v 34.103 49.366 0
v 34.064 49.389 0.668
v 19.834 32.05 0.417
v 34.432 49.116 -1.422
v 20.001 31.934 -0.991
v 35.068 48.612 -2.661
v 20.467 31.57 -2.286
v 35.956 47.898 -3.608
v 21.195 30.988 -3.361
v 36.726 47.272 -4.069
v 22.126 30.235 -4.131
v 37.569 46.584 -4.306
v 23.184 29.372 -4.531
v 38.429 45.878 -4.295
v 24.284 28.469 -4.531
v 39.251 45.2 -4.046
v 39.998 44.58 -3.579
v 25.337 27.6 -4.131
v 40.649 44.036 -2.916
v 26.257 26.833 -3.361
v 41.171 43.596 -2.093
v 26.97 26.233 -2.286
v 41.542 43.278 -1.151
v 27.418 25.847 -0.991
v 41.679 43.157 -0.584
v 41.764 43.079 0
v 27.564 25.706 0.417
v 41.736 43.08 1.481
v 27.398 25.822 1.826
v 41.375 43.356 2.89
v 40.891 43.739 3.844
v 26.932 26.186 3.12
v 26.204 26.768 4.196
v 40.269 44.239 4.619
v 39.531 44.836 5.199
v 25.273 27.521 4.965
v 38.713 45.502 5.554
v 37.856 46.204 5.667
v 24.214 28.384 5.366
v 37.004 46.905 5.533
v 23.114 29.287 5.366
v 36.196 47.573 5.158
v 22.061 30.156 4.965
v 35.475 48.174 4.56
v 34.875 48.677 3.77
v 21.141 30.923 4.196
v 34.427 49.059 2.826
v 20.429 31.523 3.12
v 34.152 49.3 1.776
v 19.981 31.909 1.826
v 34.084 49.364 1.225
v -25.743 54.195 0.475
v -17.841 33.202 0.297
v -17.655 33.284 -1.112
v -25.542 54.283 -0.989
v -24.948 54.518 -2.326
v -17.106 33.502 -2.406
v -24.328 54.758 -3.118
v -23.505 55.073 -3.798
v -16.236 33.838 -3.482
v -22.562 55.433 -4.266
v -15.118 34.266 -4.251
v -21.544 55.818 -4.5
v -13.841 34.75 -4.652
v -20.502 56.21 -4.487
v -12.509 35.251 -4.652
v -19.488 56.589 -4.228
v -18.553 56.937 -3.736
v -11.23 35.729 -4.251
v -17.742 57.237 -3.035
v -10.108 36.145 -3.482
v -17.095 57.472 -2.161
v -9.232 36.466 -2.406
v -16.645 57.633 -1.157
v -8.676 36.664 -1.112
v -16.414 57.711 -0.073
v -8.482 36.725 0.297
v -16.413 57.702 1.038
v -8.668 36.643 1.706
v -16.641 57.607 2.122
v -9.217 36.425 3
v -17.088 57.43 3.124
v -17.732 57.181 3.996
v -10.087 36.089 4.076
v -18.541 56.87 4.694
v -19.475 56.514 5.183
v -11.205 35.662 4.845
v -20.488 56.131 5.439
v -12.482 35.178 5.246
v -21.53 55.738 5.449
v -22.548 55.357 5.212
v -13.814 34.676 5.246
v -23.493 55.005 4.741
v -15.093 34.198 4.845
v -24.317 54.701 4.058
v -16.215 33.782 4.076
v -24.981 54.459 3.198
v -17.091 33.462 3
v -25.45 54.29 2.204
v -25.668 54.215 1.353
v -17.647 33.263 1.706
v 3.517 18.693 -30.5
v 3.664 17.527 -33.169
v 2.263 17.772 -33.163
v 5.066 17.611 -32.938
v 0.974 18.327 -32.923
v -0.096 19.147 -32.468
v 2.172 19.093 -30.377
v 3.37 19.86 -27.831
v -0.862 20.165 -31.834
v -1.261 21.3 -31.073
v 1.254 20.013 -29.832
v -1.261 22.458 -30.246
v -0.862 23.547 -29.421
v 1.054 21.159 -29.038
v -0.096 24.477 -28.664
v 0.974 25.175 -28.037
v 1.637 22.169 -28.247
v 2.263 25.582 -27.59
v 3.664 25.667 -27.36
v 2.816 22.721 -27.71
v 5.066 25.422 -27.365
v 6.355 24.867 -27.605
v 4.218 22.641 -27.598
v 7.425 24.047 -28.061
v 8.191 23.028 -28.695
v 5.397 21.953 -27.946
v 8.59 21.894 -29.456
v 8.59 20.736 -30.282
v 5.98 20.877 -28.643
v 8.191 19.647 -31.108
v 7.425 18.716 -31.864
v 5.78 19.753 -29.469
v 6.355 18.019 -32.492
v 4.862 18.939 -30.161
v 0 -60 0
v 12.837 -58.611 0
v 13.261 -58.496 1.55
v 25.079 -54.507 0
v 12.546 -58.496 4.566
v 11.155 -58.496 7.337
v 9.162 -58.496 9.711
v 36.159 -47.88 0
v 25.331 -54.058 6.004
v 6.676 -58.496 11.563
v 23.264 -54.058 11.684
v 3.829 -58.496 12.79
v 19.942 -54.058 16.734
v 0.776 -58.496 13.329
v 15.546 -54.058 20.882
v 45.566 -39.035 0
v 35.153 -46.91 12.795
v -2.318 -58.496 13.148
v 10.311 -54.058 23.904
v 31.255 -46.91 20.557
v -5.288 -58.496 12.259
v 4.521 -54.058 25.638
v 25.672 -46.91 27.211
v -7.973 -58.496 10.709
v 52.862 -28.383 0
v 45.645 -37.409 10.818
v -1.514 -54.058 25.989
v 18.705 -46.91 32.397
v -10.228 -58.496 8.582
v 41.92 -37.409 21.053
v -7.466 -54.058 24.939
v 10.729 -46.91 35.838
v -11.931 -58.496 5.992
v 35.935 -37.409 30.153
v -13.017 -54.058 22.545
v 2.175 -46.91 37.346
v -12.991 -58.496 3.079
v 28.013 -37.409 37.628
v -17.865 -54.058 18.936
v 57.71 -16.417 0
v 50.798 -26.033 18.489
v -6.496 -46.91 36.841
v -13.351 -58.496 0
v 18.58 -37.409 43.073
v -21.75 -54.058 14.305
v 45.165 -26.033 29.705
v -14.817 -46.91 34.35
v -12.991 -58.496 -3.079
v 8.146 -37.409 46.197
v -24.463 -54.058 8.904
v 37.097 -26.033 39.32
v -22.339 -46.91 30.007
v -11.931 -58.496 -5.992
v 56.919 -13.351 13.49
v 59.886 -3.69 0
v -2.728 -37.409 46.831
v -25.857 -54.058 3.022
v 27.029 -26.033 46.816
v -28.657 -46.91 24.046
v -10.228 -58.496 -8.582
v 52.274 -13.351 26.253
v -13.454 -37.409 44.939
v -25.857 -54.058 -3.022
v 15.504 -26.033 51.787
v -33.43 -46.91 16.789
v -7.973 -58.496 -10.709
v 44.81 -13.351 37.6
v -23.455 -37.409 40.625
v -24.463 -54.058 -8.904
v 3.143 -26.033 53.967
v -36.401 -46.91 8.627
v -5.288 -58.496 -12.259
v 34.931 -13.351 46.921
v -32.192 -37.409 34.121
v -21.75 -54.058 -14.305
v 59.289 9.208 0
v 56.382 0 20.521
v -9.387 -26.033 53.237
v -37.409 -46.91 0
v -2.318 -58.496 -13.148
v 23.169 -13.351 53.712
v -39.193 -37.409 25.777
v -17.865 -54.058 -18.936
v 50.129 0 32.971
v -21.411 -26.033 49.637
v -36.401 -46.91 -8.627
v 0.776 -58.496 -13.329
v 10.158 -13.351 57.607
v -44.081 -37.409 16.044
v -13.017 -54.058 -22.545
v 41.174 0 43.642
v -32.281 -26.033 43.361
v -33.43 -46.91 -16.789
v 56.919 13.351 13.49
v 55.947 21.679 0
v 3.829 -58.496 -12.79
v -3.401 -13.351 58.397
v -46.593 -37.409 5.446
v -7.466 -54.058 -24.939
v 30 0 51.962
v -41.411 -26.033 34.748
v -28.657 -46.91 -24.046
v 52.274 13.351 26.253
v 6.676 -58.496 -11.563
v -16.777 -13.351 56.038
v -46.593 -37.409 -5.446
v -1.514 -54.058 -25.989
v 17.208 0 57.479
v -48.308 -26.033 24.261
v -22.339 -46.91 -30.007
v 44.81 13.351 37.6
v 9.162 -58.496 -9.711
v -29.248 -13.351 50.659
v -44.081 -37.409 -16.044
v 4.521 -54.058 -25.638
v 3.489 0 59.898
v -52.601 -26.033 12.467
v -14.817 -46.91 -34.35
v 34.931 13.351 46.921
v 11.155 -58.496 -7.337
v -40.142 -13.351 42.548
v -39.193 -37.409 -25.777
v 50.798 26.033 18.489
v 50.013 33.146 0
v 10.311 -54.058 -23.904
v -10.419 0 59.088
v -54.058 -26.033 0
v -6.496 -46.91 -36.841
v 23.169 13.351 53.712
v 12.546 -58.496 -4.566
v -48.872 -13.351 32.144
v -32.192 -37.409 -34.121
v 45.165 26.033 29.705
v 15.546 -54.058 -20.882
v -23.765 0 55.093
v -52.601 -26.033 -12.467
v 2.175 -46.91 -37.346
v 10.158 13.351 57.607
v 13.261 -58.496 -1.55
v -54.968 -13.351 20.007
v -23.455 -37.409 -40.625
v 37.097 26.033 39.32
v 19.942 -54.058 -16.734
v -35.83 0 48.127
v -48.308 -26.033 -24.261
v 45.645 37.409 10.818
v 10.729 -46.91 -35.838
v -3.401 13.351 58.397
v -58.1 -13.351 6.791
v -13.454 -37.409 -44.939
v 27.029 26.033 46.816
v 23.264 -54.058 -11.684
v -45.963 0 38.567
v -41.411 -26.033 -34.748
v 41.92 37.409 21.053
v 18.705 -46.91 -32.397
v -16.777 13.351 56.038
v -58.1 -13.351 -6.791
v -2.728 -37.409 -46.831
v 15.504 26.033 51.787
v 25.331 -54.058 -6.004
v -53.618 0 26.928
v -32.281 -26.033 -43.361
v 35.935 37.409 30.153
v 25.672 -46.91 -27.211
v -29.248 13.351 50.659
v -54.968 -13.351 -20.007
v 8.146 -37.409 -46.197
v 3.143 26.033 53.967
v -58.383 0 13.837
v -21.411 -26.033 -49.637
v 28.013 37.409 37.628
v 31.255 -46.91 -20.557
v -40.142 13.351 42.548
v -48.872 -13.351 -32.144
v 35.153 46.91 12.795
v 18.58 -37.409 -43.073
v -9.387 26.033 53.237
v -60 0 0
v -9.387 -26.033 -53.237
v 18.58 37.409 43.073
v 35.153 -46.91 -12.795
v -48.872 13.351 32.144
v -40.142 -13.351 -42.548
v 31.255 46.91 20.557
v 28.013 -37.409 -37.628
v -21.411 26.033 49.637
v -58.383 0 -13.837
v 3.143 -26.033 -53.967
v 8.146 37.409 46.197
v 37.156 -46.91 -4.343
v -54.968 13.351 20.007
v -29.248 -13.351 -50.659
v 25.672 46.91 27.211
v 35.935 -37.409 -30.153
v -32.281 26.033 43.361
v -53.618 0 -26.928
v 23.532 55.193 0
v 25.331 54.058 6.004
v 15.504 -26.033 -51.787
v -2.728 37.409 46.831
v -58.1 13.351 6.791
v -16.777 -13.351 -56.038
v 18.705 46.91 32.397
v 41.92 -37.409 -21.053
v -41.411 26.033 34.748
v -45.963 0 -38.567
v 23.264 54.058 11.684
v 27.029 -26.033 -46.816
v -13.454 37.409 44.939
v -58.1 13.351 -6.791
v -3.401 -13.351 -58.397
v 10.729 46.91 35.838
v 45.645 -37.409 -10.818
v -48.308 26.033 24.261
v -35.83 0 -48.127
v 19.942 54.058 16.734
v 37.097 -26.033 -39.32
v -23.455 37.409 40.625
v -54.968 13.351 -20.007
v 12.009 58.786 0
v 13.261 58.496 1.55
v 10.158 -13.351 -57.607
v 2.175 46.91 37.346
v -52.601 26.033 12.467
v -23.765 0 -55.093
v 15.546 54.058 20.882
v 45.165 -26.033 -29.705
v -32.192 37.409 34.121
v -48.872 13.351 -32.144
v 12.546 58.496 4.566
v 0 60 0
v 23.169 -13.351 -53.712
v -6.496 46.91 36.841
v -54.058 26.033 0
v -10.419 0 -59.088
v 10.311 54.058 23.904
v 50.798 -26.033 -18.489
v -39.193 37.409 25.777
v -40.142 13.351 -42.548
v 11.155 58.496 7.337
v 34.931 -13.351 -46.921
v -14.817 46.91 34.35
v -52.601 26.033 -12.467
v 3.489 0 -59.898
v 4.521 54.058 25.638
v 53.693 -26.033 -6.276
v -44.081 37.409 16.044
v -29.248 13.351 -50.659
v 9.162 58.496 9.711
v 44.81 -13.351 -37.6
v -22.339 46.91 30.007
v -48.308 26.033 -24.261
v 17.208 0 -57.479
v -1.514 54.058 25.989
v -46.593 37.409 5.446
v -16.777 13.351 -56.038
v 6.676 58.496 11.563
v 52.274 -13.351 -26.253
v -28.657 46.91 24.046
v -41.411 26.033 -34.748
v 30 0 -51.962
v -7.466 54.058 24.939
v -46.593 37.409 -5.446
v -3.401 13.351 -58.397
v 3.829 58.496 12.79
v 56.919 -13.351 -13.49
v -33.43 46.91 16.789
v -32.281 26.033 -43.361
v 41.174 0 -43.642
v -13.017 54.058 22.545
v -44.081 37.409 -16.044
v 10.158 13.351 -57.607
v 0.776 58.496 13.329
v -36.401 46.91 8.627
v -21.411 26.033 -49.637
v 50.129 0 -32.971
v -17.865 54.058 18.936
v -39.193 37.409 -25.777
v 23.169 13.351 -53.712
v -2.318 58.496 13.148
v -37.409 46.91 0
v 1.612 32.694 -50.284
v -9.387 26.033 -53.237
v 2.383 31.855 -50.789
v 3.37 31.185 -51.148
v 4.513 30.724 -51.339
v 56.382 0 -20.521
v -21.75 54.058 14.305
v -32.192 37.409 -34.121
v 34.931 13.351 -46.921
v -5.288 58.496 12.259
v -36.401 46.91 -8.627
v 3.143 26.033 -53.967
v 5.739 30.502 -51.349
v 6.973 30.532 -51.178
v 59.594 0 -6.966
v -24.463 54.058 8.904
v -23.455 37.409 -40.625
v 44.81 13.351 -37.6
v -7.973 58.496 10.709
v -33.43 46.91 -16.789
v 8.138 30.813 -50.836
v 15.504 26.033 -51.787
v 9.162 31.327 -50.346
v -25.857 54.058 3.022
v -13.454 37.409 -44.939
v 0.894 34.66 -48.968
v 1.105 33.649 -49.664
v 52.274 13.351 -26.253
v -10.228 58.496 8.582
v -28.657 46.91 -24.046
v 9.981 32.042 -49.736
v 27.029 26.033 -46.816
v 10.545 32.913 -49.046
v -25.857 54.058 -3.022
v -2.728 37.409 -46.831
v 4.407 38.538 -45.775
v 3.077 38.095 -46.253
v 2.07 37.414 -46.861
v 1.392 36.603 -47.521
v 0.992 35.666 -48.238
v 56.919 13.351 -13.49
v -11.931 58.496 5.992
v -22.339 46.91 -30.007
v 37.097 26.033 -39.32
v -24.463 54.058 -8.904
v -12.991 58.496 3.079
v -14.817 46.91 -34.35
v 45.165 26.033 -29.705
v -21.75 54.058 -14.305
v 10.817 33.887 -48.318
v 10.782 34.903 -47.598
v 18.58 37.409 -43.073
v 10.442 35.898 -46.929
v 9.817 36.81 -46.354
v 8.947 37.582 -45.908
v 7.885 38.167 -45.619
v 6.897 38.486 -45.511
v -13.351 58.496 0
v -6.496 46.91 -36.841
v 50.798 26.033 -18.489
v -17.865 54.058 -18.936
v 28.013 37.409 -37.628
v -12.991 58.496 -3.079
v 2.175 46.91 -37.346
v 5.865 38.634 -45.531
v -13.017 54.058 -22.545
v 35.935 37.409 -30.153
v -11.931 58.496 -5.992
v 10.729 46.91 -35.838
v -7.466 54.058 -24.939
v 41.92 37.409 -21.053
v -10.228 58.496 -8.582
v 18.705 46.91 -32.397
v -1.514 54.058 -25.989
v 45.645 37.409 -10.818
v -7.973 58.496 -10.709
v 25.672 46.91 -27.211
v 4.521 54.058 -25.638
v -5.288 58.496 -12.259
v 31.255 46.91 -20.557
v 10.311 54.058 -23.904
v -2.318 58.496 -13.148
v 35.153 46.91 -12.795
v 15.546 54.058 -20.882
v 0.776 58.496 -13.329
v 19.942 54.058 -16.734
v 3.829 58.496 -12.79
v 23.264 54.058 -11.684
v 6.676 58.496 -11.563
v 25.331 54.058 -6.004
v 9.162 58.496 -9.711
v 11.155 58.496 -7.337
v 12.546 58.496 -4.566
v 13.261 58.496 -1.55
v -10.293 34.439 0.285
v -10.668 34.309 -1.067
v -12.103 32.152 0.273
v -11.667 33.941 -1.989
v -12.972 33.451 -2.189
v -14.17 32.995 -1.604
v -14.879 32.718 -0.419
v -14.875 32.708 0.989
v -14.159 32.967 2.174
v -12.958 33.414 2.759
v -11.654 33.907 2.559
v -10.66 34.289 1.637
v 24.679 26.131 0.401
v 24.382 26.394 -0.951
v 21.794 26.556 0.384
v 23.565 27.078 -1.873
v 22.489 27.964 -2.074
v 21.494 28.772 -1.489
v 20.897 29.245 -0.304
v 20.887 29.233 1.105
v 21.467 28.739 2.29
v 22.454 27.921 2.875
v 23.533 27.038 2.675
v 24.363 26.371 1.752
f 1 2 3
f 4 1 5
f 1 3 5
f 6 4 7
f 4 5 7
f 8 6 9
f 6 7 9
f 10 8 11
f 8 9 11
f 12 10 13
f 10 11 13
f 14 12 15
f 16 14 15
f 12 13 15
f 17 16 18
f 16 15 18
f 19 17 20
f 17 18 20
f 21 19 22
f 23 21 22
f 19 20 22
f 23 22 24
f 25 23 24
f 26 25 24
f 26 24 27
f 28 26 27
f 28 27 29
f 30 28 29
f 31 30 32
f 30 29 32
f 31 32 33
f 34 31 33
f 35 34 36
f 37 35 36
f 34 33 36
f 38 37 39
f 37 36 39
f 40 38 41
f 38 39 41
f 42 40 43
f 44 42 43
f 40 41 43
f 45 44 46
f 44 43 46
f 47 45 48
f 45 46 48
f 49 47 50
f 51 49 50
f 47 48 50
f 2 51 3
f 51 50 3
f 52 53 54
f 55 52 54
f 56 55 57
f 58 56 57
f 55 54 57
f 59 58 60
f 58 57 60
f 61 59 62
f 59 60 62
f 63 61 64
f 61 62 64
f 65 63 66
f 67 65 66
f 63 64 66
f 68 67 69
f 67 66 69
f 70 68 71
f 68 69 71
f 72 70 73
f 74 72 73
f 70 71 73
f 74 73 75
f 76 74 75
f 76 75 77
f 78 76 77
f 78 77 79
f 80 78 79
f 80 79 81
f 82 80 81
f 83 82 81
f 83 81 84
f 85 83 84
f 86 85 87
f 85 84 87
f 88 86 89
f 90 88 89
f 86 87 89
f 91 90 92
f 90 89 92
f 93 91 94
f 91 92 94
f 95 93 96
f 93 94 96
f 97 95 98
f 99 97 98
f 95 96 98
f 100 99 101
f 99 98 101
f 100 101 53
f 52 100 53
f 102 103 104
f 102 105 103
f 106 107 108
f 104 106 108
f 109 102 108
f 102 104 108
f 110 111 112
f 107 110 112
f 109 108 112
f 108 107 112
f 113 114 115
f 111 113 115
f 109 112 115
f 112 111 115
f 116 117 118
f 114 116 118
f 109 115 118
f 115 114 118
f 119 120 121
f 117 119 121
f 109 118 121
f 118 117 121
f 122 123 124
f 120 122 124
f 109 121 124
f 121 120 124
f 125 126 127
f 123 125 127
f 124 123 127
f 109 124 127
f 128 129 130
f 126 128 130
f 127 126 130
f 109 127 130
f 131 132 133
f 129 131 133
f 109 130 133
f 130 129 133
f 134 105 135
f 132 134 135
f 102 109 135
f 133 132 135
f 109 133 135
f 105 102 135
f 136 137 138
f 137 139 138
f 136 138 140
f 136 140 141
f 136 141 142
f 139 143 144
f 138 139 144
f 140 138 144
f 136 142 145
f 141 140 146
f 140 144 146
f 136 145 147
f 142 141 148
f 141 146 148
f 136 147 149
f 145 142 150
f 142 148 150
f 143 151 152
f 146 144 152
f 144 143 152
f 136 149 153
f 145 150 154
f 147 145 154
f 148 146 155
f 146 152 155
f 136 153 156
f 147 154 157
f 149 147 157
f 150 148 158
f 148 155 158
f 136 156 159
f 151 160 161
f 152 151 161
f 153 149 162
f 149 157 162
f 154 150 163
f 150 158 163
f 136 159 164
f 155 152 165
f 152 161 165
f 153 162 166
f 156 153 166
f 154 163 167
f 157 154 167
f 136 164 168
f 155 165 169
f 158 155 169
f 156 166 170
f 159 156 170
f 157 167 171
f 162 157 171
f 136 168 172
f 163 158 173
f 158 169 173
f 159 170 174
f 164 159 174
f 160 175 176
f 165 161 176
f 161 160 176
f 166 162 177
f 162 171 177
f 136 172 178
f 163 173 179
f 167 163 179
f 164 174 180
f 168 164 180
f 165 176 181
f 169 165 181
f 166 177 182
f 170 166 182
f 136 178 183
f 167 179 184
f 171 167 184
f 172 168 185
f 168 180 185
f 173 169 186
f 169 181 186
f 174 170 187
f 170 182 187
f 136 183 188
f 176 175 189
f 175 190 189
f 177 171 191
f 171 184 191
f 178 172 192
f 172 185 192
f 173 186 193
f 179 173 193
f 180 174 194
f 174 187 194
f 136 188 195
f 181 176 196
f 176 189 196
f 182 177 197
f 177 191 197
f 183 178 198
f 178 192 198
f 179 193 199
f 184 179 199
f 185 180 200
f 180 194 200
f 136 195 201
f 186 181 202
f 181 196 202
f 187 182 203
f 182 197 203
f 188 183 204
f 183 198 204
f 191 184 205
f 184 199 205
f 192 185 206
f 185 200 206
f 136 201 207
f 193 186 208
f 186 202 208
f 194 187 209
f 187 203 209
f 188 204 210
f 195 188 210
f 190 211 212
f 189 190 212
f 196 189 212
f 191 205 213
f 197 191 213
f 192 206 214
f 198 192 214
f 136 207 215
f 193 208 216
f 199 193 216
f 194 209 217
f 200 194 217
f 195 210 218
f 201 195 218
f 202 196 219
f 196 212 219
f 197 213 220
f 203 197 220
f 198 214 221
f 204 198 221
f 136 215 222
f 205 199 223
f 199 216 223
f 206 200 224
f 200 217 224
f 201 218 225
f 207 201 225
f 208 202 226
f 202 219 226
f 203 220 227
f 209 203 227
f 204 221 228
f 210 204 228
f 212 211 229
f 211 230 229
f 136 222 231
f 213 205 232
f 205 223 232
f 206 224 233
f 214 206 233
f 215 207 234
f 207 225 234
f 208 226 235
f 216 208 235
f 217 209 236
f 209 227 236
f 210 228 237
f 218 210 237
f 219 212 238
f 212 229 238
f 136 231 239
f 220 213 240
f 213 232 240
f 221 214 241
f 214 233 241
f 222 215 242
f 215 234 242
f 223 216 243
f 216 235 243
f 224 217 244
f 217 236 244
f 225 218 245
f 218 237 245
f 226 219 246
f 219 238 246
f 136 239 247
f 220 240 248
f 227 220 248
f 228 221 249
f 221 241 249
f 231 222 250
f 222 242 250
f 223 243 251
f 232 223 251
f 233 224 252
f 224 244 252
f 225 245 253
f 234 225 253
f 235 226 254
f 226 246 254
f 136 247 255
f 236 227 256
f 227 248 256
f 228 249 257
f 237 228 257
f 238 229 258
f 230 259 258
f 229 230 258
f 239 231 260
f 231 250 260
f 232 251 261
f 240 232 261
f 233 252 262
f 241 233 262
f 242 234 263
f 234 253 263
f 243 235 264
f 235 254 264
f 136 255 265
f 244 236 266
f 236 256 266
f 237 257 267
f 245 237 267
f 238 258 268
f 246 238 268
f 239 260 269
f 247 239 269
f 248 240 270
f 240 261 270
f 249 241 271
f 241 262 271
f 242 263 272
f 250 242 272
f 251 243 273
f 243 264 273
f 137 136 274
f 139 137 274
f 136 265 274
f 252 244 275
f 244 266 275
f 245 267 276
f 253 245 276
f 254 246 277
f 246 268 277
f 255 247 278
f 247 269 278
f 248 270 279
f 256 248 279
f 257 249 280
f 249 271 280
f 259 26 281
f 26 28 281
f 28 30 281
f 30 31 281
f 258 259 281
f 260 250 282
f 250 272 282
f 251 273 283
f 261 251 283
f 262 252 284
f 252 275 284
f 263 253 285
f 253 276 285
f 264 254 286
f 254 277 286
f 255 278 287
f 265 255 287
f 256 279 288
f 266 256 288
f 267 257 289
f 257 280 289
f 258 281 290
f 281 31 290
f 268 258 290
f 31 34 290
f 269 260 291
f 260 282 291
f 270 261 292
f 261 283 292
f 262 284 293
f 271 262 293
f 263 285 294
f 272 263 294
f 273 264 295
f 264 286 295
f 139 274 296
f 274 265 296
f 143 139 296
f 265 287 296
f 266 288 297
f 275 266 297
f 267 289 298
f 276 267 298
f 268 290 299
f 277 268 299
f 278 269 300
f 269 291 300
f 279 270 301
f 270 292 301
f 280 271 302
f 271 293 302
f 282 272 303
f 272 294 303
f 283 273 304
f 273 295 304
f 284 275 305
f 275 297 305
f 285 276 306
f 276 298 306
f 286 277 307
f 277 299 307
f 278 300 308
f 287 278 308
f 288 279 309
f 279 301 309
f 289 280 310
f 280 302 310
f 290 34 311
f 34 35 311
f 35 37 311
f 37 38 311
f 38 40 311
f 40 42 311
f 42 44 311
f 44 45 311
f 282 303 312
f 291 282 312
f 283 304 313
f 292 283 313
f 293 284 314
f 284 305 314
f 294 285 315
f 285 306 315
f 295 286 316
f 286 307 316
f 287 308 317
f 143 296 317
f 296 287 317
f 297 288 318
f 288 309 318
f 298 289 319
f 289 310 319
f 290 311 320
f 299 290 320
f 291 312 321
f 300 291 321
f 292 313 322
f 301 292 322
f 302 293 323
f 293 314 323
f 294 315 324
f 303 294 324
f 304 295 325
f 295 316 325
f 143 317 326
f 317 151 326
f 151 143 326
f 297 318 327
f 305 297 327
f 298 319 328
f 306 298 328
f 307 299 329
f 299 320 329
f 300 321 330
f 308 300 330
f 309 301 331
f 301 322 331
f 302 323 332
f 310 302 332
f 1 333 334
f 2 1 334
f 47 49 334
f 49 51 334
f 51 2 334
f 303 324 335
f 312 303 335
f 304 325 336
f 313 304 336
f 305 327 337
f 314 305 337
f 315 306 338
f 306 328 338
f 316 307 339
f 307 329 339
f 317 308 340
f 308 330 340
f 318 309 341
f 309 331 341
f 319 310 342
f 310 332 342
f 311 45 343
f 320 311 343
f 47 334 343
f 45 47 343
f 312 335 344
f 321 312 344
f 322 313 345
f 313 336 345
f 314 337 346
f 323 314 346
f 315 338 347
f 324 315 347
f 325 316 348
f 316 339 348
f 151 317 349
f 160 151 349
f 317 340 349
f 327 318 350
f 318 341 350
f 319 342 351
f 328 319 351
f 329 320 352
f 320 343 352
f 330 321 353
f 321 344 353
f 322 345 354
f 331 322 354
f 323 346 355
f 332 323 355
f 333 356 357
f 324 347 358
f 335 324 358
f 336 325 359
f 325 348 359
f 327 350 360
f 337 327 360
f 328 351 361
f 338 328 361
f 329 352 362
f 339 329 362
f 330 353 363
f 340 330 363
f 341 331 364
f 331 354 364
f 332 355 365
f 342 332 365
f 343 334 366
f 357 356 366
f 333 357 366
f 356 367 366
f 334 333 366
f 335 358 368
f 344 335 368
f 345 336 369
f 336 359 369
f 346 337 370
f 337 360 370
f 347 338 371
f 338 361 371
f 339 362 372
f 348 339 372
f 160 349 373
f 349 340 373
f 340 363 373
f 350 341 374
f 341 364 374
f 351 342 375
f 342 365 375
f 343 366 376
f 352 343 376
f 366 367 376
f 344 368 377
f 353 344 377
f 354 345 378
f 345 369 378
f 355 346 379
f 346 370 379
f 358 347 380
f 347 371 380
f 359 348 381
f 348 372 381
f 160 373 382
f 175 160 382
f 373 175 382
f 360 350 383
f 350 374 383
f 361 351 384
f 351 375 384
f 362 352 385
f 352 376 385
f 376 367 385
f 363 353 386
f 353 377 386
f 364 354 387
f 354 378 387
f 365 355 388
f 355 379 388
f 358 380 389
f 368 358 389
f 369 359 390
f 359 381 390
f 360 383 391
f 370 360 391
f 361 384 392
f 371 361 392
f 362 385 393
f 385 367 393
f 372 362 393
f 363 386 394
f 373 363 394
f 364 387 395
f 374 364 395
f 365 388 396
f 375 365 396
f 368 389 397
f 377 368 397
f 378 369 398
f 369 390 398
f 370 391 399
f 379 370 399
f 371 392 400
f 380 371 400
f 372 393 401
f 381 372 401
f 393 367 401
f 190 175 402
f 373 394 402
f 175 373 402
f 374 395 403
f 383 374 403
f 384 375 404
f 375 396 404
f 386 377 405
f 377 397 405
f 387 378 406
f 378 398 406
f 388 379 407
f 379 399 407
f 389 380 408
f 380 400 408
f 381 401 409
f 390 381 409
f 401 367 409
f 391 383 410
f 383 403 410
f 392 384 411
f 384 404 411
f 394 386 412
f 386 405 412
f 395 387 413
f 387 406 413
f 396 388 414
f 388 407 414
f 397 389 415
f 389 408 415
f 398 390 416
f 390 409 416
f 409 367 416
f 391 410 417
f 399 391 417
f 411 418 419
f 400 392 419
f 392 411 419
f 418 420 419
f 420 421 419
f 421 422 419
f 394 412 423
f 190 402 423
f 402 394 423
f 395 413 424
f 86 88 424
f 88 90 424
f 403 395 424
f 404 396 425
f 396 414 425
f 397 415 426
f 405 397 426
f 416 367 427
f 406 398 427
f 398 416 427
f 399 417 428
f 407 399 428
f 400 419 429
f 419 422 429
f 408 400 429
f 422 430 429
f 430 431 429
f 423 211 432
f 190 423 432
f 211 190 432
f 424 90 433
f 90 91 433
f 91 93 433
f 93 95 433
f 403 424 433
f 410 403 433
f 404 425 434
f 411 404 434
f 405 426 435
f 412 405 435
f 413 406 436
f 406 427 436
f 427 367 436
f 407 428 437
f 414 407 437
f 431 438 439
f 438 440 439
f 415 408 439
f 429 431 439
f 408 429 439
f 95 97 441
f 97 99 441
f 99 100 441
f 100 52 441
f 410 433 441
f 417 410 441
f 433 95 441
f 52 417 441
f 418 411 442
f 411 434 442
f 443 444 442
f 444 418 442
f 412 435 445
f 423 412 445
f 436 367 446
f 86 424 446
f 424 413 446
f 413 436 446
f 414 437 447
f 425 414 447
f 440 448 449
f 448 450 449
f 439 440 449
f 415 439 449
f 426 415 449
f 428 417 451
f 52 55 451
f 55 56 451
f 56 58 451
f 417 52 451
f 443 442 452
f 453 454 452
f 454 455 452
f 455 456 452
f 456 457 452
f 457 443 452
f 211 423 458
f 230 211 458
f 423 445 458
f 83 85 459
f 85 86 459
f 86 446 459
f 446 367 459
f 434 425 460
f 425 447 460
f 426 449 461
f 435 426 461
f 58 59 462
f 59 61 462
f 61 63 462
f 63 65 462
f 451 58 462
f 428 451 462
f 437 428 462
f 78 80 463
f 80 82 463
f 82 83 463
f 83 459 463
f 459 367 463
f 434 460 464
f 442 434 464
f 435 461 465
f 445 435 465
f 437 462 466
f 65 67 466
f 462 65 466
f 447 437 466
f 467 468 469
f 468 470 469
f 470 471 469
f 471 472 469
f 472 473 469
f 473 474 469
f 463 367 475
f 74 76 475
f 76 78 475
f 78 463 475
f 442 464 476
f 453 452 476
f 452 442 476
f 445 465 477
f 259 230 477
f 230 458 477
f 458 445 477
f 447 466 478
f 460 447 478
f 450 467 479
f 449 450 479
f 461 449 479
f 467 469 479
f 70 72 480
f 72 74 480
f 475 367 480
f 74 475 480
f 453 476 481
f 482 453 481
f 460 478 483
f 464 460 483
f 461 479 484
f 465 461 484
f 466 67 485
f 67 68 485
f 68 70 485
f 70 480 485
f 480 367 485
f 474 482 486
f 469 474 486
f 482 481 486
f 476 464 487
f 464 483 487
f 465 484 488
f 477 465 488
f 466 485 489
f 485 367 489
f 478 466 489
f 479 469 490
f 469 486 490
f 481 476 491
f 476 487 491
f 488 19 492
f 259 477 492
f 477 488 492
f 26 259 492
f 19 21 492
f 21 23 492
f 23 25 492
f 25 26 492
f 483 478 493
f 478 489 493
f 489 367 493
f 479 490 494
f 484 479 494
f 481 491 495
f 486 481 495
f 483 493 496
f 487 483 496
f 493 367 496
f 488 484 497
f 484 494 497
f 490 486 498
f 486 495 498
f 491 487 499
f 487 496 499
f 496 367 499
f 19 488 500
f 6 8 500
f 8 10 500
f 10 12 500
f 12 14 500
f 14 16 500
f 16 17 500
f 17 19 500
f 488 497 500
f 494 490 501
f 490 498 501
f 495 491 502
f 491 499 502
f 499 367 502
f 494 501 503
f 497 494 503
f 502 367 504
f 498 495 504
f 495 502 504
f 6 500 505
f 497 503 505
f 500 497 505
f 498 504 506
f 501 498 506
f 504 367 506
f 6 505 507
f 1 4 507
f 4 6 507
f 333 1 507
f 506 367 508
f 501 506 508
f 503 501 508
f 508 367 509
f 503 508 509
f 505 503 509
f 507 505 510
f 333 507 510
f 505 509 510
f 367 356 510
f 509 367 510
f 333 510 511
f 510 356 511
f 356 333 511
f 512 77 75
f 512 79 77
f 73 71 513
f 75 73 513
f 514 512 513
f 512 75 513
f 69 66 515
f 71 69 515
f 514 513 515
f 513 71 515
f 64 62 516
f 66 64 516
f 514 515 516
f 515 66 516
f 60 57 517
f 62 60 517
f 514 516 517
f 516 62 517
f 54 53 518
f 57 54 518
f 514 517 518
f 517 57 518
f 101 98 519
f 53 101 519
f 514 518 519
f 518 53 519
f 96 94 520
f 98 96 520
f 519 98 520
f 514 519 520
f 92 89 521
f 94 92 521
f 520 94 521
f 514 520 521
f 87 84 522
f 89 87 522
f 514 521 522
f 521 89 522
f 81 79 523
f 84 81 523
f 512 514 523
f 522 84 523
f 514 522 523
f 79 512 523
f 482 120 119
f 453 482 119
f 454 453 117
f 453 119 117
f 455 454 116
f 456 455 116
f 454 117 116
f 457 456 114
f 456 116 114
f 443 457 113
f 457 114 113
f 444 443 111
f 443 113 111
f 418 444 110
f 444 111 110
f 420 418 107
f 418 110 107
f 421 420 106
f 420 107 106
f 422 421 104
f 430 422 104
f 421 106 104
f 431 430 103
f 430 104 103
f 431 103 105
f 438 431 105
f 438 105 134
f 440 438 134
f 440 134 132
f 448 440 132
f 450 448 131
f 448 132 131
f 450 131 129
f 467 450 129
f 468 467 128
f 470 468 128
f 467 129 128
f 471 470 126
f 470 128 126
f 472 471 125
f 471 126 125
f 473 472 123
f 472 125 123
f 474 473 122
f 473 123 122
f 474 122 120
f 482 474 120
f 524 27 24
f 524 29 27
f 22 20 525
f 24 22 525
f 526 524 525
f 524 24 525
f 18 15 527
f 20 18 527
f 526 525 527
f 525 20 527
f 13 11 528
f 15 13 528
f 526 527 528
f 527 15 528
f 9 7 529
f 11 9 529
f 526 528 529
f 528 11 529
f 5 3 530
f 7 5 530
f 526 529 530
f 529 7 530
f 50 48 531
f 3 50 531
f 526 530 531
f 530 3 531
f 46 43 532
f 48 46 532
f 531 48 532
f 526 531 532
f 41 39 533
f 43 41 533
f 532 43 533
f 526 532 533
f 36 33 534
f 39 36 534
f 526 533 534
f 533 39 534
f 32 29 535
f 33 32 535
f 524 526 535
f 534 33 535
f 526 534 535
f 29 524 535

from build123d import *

# Parameters (mm, degrees)
F_10_0_10_DURCHMESSER_BOHRUNG1_D                     = 10
F_10_0_10_DURCHMESSER_BOHRUNG1_DEPTH                 = 22.64
F_10_0_10_DURCHMESSER_BOHRUNG1_CSINK_D               = 10.05
F_10_0_10_DURCHMESSER_BOHRUNG1_CSINK_ANGLE           = 90
F_10_0_10_DURCHMESSER_BOHRUNG1_TIP                   = 3.004303095
F_10_0_10_DURCHMESSER_BOHRUNG1_ON_FACE_2_D           = 10
F_10_0_10_DURCHMESSER_BOHRUNG1_ON_FACE_2_DEPTH       = 22.64
F_10_0_10_DURCHMESSER_BOHRUNG1_ON_FACE_2_CSINK_D     = 10.05
F_10_0_10_DURCHMESSER_BOHRUNG1_ON_FACE_2_CSINK_ANGLE = 90
F_10_0_10_DURCHMESSER_BOHRUNG1_ON_FACE_2_TIP         = 3.004303095
F_10_0_10_DURCHMESSER_BOHRUNG1_ON_FACE_3_D           = 10
F_10_0_10_DURCHMESSER_BOHRUNG1_ON_FACE_3_DEPTH       = 22.64
F_10_0_10_DURCHMESSER_BOHRUNG1_ON_FACE_3_CSINK_D     = 10.05
F_10_0_10_DURCHMESSER_BOHRUNG1_ON_FACE_3_CSINK_ANGLE = 90
F_10_0_10_DURCHMESSER_BOHRUNG1_ON_FACE_3_TIP         = 3.004303095


with BuildPart() as part:
    # Skizze1 → Rotation1 (revolve)
    with BuildSketch(Plane.XY):
        with BuildLine():
            Line((0, 60), (0, -60))
            ThreePointArc((0, -60), (60, 0), (0, 60))
        make_face()
    revolve(axis=Axis((0, 60, 0), (0, -1, 0)))

    # 10.0 _10_ Durchmesser Bohrung1
    with Locations(Plane(origin=(38.060989939, 46.377923621, 0.670257752), x_dir=(0.773013628, -0.634389416, 0), z_dir=(0.634349832, 0.772965394, 0.011170963))):
        with Locations((0, 0)):
            CounterSinkHole(F_10_0_10_DURCHMESSER_BOHRUNG1_D / 2, F_10_0_10_DURCHMESSER_BOHRUNG1_CSINK_D / 2, depth=F_10_0_10_DURCHMESSER_BOHRUNG1_DEPTH, counter_sink_angle=F_10_0_10_DURCHMESSER_BOHRUNG1_CSINK_ANGLE)
            with Locations((0, 0, -(F_10_0_10_DURCHMESSER_BOHRUNG1_DEPTH + F_10_0_10_DURCHMESSER_BOHRUNG1_TIP / 2))):  # 118° drill point
                Cone(0, F_10_0_10_DURCHMESSER_BOHRUNG1_D / 2, F_10_0_10_DURCHMESSER_BOHRUNG1_TIP, mode=Mode.SUBTRACT)

    # 10.0 _10_ Durchmesser Bohrung1 on face 2
    with Locations(Plane(origin=(-21.137326584, 56.151455854, 0.476896544), x_dir=(0.935887137, 0.352299968, 0), z_dir=(-0.35228884, 0.935857576, 0.007947996))):
        with Locations((0, 0)):
            CounterSinkHole(F_10_0_10_DURCHMESSER_BOHRUNG1_ON_FACE_2_D / 2, F_10_0_10_DURCHMESSER_BOHRUNG1_ON_FACE_2_CSINK_D / 2, depth=F_10_0_10_DURCHMESSER_BOHRUNG1_ON_FACE_2_DEPTH, counter_sink_angle=F_10_0_10_DURCHMESSER_BOHRUNG1_ON_FACE_2_CSINK_ANGLE)
            with Locations((0, 0, -(F_10_0_10_DURCHMESSER_BOHRUNG1_ON_FACE_2_DEPTH + F_10_0_10_DURCHMESSER_BOHRUNG1_ON_FACE_2_TIP / 2))):  # 118° drill point
                Cone(0, F_10_0_10_DURCHMESSER_BOHRUNG1_ON_FACE_2_D / 2, F_10_0_10_DURCHMESSER_BOHRUNG1_ON_FACE_2_TIP, mode=Mode.SUBTRACT)

    # 10.0 _10_ Durchmesser Bohrung1 on face 3
    with Locations(Plane(origin=(5.885070461, 34.684297812, -48.604170922), x_dir=(0, -0.813994513, -0.580872562), z_dir=(0.098084936, 0.578071622, -0.81006947))):
        with Locations((0, 0)):
            CounterSinkHole(F_10_0_10_DURCHMESSER_BOHRUNG1_ON_FACE_3_D / 2, F_10_0_10_DURCHMESSER_BOHRUNG1_ON_FACE_3_CSINK_D / 2, depth=F_10_0_10_DURCHMESSER_BOHRUNG1_ON_FACE_3_DEPTH, counter_sink_angle=F_10_0_10_DURCHMESSER_BOHRUNG1_ON_FACE_3_CSINK_ANGLE)
            with Locations((0, 0, -(F_10_0_10_DURCHMESSER_BOHRUNG1_ON_FACE_3_DEPTH + F_10_0_10_DURCHMESSER_BOHRUNG1_ON_FACE_3_TIP / 2))):  # 118° drill point
                Cone(0, F_10_0_10_DURCHMESSER_BOHRUNG1_ON_FACE_3_D / 2, F_10_0_10_DURCHMESSER_BOHRUNG1_ON_FACE_3_TIP, mode=Mode.SUBTRACT)


solid = part.part
